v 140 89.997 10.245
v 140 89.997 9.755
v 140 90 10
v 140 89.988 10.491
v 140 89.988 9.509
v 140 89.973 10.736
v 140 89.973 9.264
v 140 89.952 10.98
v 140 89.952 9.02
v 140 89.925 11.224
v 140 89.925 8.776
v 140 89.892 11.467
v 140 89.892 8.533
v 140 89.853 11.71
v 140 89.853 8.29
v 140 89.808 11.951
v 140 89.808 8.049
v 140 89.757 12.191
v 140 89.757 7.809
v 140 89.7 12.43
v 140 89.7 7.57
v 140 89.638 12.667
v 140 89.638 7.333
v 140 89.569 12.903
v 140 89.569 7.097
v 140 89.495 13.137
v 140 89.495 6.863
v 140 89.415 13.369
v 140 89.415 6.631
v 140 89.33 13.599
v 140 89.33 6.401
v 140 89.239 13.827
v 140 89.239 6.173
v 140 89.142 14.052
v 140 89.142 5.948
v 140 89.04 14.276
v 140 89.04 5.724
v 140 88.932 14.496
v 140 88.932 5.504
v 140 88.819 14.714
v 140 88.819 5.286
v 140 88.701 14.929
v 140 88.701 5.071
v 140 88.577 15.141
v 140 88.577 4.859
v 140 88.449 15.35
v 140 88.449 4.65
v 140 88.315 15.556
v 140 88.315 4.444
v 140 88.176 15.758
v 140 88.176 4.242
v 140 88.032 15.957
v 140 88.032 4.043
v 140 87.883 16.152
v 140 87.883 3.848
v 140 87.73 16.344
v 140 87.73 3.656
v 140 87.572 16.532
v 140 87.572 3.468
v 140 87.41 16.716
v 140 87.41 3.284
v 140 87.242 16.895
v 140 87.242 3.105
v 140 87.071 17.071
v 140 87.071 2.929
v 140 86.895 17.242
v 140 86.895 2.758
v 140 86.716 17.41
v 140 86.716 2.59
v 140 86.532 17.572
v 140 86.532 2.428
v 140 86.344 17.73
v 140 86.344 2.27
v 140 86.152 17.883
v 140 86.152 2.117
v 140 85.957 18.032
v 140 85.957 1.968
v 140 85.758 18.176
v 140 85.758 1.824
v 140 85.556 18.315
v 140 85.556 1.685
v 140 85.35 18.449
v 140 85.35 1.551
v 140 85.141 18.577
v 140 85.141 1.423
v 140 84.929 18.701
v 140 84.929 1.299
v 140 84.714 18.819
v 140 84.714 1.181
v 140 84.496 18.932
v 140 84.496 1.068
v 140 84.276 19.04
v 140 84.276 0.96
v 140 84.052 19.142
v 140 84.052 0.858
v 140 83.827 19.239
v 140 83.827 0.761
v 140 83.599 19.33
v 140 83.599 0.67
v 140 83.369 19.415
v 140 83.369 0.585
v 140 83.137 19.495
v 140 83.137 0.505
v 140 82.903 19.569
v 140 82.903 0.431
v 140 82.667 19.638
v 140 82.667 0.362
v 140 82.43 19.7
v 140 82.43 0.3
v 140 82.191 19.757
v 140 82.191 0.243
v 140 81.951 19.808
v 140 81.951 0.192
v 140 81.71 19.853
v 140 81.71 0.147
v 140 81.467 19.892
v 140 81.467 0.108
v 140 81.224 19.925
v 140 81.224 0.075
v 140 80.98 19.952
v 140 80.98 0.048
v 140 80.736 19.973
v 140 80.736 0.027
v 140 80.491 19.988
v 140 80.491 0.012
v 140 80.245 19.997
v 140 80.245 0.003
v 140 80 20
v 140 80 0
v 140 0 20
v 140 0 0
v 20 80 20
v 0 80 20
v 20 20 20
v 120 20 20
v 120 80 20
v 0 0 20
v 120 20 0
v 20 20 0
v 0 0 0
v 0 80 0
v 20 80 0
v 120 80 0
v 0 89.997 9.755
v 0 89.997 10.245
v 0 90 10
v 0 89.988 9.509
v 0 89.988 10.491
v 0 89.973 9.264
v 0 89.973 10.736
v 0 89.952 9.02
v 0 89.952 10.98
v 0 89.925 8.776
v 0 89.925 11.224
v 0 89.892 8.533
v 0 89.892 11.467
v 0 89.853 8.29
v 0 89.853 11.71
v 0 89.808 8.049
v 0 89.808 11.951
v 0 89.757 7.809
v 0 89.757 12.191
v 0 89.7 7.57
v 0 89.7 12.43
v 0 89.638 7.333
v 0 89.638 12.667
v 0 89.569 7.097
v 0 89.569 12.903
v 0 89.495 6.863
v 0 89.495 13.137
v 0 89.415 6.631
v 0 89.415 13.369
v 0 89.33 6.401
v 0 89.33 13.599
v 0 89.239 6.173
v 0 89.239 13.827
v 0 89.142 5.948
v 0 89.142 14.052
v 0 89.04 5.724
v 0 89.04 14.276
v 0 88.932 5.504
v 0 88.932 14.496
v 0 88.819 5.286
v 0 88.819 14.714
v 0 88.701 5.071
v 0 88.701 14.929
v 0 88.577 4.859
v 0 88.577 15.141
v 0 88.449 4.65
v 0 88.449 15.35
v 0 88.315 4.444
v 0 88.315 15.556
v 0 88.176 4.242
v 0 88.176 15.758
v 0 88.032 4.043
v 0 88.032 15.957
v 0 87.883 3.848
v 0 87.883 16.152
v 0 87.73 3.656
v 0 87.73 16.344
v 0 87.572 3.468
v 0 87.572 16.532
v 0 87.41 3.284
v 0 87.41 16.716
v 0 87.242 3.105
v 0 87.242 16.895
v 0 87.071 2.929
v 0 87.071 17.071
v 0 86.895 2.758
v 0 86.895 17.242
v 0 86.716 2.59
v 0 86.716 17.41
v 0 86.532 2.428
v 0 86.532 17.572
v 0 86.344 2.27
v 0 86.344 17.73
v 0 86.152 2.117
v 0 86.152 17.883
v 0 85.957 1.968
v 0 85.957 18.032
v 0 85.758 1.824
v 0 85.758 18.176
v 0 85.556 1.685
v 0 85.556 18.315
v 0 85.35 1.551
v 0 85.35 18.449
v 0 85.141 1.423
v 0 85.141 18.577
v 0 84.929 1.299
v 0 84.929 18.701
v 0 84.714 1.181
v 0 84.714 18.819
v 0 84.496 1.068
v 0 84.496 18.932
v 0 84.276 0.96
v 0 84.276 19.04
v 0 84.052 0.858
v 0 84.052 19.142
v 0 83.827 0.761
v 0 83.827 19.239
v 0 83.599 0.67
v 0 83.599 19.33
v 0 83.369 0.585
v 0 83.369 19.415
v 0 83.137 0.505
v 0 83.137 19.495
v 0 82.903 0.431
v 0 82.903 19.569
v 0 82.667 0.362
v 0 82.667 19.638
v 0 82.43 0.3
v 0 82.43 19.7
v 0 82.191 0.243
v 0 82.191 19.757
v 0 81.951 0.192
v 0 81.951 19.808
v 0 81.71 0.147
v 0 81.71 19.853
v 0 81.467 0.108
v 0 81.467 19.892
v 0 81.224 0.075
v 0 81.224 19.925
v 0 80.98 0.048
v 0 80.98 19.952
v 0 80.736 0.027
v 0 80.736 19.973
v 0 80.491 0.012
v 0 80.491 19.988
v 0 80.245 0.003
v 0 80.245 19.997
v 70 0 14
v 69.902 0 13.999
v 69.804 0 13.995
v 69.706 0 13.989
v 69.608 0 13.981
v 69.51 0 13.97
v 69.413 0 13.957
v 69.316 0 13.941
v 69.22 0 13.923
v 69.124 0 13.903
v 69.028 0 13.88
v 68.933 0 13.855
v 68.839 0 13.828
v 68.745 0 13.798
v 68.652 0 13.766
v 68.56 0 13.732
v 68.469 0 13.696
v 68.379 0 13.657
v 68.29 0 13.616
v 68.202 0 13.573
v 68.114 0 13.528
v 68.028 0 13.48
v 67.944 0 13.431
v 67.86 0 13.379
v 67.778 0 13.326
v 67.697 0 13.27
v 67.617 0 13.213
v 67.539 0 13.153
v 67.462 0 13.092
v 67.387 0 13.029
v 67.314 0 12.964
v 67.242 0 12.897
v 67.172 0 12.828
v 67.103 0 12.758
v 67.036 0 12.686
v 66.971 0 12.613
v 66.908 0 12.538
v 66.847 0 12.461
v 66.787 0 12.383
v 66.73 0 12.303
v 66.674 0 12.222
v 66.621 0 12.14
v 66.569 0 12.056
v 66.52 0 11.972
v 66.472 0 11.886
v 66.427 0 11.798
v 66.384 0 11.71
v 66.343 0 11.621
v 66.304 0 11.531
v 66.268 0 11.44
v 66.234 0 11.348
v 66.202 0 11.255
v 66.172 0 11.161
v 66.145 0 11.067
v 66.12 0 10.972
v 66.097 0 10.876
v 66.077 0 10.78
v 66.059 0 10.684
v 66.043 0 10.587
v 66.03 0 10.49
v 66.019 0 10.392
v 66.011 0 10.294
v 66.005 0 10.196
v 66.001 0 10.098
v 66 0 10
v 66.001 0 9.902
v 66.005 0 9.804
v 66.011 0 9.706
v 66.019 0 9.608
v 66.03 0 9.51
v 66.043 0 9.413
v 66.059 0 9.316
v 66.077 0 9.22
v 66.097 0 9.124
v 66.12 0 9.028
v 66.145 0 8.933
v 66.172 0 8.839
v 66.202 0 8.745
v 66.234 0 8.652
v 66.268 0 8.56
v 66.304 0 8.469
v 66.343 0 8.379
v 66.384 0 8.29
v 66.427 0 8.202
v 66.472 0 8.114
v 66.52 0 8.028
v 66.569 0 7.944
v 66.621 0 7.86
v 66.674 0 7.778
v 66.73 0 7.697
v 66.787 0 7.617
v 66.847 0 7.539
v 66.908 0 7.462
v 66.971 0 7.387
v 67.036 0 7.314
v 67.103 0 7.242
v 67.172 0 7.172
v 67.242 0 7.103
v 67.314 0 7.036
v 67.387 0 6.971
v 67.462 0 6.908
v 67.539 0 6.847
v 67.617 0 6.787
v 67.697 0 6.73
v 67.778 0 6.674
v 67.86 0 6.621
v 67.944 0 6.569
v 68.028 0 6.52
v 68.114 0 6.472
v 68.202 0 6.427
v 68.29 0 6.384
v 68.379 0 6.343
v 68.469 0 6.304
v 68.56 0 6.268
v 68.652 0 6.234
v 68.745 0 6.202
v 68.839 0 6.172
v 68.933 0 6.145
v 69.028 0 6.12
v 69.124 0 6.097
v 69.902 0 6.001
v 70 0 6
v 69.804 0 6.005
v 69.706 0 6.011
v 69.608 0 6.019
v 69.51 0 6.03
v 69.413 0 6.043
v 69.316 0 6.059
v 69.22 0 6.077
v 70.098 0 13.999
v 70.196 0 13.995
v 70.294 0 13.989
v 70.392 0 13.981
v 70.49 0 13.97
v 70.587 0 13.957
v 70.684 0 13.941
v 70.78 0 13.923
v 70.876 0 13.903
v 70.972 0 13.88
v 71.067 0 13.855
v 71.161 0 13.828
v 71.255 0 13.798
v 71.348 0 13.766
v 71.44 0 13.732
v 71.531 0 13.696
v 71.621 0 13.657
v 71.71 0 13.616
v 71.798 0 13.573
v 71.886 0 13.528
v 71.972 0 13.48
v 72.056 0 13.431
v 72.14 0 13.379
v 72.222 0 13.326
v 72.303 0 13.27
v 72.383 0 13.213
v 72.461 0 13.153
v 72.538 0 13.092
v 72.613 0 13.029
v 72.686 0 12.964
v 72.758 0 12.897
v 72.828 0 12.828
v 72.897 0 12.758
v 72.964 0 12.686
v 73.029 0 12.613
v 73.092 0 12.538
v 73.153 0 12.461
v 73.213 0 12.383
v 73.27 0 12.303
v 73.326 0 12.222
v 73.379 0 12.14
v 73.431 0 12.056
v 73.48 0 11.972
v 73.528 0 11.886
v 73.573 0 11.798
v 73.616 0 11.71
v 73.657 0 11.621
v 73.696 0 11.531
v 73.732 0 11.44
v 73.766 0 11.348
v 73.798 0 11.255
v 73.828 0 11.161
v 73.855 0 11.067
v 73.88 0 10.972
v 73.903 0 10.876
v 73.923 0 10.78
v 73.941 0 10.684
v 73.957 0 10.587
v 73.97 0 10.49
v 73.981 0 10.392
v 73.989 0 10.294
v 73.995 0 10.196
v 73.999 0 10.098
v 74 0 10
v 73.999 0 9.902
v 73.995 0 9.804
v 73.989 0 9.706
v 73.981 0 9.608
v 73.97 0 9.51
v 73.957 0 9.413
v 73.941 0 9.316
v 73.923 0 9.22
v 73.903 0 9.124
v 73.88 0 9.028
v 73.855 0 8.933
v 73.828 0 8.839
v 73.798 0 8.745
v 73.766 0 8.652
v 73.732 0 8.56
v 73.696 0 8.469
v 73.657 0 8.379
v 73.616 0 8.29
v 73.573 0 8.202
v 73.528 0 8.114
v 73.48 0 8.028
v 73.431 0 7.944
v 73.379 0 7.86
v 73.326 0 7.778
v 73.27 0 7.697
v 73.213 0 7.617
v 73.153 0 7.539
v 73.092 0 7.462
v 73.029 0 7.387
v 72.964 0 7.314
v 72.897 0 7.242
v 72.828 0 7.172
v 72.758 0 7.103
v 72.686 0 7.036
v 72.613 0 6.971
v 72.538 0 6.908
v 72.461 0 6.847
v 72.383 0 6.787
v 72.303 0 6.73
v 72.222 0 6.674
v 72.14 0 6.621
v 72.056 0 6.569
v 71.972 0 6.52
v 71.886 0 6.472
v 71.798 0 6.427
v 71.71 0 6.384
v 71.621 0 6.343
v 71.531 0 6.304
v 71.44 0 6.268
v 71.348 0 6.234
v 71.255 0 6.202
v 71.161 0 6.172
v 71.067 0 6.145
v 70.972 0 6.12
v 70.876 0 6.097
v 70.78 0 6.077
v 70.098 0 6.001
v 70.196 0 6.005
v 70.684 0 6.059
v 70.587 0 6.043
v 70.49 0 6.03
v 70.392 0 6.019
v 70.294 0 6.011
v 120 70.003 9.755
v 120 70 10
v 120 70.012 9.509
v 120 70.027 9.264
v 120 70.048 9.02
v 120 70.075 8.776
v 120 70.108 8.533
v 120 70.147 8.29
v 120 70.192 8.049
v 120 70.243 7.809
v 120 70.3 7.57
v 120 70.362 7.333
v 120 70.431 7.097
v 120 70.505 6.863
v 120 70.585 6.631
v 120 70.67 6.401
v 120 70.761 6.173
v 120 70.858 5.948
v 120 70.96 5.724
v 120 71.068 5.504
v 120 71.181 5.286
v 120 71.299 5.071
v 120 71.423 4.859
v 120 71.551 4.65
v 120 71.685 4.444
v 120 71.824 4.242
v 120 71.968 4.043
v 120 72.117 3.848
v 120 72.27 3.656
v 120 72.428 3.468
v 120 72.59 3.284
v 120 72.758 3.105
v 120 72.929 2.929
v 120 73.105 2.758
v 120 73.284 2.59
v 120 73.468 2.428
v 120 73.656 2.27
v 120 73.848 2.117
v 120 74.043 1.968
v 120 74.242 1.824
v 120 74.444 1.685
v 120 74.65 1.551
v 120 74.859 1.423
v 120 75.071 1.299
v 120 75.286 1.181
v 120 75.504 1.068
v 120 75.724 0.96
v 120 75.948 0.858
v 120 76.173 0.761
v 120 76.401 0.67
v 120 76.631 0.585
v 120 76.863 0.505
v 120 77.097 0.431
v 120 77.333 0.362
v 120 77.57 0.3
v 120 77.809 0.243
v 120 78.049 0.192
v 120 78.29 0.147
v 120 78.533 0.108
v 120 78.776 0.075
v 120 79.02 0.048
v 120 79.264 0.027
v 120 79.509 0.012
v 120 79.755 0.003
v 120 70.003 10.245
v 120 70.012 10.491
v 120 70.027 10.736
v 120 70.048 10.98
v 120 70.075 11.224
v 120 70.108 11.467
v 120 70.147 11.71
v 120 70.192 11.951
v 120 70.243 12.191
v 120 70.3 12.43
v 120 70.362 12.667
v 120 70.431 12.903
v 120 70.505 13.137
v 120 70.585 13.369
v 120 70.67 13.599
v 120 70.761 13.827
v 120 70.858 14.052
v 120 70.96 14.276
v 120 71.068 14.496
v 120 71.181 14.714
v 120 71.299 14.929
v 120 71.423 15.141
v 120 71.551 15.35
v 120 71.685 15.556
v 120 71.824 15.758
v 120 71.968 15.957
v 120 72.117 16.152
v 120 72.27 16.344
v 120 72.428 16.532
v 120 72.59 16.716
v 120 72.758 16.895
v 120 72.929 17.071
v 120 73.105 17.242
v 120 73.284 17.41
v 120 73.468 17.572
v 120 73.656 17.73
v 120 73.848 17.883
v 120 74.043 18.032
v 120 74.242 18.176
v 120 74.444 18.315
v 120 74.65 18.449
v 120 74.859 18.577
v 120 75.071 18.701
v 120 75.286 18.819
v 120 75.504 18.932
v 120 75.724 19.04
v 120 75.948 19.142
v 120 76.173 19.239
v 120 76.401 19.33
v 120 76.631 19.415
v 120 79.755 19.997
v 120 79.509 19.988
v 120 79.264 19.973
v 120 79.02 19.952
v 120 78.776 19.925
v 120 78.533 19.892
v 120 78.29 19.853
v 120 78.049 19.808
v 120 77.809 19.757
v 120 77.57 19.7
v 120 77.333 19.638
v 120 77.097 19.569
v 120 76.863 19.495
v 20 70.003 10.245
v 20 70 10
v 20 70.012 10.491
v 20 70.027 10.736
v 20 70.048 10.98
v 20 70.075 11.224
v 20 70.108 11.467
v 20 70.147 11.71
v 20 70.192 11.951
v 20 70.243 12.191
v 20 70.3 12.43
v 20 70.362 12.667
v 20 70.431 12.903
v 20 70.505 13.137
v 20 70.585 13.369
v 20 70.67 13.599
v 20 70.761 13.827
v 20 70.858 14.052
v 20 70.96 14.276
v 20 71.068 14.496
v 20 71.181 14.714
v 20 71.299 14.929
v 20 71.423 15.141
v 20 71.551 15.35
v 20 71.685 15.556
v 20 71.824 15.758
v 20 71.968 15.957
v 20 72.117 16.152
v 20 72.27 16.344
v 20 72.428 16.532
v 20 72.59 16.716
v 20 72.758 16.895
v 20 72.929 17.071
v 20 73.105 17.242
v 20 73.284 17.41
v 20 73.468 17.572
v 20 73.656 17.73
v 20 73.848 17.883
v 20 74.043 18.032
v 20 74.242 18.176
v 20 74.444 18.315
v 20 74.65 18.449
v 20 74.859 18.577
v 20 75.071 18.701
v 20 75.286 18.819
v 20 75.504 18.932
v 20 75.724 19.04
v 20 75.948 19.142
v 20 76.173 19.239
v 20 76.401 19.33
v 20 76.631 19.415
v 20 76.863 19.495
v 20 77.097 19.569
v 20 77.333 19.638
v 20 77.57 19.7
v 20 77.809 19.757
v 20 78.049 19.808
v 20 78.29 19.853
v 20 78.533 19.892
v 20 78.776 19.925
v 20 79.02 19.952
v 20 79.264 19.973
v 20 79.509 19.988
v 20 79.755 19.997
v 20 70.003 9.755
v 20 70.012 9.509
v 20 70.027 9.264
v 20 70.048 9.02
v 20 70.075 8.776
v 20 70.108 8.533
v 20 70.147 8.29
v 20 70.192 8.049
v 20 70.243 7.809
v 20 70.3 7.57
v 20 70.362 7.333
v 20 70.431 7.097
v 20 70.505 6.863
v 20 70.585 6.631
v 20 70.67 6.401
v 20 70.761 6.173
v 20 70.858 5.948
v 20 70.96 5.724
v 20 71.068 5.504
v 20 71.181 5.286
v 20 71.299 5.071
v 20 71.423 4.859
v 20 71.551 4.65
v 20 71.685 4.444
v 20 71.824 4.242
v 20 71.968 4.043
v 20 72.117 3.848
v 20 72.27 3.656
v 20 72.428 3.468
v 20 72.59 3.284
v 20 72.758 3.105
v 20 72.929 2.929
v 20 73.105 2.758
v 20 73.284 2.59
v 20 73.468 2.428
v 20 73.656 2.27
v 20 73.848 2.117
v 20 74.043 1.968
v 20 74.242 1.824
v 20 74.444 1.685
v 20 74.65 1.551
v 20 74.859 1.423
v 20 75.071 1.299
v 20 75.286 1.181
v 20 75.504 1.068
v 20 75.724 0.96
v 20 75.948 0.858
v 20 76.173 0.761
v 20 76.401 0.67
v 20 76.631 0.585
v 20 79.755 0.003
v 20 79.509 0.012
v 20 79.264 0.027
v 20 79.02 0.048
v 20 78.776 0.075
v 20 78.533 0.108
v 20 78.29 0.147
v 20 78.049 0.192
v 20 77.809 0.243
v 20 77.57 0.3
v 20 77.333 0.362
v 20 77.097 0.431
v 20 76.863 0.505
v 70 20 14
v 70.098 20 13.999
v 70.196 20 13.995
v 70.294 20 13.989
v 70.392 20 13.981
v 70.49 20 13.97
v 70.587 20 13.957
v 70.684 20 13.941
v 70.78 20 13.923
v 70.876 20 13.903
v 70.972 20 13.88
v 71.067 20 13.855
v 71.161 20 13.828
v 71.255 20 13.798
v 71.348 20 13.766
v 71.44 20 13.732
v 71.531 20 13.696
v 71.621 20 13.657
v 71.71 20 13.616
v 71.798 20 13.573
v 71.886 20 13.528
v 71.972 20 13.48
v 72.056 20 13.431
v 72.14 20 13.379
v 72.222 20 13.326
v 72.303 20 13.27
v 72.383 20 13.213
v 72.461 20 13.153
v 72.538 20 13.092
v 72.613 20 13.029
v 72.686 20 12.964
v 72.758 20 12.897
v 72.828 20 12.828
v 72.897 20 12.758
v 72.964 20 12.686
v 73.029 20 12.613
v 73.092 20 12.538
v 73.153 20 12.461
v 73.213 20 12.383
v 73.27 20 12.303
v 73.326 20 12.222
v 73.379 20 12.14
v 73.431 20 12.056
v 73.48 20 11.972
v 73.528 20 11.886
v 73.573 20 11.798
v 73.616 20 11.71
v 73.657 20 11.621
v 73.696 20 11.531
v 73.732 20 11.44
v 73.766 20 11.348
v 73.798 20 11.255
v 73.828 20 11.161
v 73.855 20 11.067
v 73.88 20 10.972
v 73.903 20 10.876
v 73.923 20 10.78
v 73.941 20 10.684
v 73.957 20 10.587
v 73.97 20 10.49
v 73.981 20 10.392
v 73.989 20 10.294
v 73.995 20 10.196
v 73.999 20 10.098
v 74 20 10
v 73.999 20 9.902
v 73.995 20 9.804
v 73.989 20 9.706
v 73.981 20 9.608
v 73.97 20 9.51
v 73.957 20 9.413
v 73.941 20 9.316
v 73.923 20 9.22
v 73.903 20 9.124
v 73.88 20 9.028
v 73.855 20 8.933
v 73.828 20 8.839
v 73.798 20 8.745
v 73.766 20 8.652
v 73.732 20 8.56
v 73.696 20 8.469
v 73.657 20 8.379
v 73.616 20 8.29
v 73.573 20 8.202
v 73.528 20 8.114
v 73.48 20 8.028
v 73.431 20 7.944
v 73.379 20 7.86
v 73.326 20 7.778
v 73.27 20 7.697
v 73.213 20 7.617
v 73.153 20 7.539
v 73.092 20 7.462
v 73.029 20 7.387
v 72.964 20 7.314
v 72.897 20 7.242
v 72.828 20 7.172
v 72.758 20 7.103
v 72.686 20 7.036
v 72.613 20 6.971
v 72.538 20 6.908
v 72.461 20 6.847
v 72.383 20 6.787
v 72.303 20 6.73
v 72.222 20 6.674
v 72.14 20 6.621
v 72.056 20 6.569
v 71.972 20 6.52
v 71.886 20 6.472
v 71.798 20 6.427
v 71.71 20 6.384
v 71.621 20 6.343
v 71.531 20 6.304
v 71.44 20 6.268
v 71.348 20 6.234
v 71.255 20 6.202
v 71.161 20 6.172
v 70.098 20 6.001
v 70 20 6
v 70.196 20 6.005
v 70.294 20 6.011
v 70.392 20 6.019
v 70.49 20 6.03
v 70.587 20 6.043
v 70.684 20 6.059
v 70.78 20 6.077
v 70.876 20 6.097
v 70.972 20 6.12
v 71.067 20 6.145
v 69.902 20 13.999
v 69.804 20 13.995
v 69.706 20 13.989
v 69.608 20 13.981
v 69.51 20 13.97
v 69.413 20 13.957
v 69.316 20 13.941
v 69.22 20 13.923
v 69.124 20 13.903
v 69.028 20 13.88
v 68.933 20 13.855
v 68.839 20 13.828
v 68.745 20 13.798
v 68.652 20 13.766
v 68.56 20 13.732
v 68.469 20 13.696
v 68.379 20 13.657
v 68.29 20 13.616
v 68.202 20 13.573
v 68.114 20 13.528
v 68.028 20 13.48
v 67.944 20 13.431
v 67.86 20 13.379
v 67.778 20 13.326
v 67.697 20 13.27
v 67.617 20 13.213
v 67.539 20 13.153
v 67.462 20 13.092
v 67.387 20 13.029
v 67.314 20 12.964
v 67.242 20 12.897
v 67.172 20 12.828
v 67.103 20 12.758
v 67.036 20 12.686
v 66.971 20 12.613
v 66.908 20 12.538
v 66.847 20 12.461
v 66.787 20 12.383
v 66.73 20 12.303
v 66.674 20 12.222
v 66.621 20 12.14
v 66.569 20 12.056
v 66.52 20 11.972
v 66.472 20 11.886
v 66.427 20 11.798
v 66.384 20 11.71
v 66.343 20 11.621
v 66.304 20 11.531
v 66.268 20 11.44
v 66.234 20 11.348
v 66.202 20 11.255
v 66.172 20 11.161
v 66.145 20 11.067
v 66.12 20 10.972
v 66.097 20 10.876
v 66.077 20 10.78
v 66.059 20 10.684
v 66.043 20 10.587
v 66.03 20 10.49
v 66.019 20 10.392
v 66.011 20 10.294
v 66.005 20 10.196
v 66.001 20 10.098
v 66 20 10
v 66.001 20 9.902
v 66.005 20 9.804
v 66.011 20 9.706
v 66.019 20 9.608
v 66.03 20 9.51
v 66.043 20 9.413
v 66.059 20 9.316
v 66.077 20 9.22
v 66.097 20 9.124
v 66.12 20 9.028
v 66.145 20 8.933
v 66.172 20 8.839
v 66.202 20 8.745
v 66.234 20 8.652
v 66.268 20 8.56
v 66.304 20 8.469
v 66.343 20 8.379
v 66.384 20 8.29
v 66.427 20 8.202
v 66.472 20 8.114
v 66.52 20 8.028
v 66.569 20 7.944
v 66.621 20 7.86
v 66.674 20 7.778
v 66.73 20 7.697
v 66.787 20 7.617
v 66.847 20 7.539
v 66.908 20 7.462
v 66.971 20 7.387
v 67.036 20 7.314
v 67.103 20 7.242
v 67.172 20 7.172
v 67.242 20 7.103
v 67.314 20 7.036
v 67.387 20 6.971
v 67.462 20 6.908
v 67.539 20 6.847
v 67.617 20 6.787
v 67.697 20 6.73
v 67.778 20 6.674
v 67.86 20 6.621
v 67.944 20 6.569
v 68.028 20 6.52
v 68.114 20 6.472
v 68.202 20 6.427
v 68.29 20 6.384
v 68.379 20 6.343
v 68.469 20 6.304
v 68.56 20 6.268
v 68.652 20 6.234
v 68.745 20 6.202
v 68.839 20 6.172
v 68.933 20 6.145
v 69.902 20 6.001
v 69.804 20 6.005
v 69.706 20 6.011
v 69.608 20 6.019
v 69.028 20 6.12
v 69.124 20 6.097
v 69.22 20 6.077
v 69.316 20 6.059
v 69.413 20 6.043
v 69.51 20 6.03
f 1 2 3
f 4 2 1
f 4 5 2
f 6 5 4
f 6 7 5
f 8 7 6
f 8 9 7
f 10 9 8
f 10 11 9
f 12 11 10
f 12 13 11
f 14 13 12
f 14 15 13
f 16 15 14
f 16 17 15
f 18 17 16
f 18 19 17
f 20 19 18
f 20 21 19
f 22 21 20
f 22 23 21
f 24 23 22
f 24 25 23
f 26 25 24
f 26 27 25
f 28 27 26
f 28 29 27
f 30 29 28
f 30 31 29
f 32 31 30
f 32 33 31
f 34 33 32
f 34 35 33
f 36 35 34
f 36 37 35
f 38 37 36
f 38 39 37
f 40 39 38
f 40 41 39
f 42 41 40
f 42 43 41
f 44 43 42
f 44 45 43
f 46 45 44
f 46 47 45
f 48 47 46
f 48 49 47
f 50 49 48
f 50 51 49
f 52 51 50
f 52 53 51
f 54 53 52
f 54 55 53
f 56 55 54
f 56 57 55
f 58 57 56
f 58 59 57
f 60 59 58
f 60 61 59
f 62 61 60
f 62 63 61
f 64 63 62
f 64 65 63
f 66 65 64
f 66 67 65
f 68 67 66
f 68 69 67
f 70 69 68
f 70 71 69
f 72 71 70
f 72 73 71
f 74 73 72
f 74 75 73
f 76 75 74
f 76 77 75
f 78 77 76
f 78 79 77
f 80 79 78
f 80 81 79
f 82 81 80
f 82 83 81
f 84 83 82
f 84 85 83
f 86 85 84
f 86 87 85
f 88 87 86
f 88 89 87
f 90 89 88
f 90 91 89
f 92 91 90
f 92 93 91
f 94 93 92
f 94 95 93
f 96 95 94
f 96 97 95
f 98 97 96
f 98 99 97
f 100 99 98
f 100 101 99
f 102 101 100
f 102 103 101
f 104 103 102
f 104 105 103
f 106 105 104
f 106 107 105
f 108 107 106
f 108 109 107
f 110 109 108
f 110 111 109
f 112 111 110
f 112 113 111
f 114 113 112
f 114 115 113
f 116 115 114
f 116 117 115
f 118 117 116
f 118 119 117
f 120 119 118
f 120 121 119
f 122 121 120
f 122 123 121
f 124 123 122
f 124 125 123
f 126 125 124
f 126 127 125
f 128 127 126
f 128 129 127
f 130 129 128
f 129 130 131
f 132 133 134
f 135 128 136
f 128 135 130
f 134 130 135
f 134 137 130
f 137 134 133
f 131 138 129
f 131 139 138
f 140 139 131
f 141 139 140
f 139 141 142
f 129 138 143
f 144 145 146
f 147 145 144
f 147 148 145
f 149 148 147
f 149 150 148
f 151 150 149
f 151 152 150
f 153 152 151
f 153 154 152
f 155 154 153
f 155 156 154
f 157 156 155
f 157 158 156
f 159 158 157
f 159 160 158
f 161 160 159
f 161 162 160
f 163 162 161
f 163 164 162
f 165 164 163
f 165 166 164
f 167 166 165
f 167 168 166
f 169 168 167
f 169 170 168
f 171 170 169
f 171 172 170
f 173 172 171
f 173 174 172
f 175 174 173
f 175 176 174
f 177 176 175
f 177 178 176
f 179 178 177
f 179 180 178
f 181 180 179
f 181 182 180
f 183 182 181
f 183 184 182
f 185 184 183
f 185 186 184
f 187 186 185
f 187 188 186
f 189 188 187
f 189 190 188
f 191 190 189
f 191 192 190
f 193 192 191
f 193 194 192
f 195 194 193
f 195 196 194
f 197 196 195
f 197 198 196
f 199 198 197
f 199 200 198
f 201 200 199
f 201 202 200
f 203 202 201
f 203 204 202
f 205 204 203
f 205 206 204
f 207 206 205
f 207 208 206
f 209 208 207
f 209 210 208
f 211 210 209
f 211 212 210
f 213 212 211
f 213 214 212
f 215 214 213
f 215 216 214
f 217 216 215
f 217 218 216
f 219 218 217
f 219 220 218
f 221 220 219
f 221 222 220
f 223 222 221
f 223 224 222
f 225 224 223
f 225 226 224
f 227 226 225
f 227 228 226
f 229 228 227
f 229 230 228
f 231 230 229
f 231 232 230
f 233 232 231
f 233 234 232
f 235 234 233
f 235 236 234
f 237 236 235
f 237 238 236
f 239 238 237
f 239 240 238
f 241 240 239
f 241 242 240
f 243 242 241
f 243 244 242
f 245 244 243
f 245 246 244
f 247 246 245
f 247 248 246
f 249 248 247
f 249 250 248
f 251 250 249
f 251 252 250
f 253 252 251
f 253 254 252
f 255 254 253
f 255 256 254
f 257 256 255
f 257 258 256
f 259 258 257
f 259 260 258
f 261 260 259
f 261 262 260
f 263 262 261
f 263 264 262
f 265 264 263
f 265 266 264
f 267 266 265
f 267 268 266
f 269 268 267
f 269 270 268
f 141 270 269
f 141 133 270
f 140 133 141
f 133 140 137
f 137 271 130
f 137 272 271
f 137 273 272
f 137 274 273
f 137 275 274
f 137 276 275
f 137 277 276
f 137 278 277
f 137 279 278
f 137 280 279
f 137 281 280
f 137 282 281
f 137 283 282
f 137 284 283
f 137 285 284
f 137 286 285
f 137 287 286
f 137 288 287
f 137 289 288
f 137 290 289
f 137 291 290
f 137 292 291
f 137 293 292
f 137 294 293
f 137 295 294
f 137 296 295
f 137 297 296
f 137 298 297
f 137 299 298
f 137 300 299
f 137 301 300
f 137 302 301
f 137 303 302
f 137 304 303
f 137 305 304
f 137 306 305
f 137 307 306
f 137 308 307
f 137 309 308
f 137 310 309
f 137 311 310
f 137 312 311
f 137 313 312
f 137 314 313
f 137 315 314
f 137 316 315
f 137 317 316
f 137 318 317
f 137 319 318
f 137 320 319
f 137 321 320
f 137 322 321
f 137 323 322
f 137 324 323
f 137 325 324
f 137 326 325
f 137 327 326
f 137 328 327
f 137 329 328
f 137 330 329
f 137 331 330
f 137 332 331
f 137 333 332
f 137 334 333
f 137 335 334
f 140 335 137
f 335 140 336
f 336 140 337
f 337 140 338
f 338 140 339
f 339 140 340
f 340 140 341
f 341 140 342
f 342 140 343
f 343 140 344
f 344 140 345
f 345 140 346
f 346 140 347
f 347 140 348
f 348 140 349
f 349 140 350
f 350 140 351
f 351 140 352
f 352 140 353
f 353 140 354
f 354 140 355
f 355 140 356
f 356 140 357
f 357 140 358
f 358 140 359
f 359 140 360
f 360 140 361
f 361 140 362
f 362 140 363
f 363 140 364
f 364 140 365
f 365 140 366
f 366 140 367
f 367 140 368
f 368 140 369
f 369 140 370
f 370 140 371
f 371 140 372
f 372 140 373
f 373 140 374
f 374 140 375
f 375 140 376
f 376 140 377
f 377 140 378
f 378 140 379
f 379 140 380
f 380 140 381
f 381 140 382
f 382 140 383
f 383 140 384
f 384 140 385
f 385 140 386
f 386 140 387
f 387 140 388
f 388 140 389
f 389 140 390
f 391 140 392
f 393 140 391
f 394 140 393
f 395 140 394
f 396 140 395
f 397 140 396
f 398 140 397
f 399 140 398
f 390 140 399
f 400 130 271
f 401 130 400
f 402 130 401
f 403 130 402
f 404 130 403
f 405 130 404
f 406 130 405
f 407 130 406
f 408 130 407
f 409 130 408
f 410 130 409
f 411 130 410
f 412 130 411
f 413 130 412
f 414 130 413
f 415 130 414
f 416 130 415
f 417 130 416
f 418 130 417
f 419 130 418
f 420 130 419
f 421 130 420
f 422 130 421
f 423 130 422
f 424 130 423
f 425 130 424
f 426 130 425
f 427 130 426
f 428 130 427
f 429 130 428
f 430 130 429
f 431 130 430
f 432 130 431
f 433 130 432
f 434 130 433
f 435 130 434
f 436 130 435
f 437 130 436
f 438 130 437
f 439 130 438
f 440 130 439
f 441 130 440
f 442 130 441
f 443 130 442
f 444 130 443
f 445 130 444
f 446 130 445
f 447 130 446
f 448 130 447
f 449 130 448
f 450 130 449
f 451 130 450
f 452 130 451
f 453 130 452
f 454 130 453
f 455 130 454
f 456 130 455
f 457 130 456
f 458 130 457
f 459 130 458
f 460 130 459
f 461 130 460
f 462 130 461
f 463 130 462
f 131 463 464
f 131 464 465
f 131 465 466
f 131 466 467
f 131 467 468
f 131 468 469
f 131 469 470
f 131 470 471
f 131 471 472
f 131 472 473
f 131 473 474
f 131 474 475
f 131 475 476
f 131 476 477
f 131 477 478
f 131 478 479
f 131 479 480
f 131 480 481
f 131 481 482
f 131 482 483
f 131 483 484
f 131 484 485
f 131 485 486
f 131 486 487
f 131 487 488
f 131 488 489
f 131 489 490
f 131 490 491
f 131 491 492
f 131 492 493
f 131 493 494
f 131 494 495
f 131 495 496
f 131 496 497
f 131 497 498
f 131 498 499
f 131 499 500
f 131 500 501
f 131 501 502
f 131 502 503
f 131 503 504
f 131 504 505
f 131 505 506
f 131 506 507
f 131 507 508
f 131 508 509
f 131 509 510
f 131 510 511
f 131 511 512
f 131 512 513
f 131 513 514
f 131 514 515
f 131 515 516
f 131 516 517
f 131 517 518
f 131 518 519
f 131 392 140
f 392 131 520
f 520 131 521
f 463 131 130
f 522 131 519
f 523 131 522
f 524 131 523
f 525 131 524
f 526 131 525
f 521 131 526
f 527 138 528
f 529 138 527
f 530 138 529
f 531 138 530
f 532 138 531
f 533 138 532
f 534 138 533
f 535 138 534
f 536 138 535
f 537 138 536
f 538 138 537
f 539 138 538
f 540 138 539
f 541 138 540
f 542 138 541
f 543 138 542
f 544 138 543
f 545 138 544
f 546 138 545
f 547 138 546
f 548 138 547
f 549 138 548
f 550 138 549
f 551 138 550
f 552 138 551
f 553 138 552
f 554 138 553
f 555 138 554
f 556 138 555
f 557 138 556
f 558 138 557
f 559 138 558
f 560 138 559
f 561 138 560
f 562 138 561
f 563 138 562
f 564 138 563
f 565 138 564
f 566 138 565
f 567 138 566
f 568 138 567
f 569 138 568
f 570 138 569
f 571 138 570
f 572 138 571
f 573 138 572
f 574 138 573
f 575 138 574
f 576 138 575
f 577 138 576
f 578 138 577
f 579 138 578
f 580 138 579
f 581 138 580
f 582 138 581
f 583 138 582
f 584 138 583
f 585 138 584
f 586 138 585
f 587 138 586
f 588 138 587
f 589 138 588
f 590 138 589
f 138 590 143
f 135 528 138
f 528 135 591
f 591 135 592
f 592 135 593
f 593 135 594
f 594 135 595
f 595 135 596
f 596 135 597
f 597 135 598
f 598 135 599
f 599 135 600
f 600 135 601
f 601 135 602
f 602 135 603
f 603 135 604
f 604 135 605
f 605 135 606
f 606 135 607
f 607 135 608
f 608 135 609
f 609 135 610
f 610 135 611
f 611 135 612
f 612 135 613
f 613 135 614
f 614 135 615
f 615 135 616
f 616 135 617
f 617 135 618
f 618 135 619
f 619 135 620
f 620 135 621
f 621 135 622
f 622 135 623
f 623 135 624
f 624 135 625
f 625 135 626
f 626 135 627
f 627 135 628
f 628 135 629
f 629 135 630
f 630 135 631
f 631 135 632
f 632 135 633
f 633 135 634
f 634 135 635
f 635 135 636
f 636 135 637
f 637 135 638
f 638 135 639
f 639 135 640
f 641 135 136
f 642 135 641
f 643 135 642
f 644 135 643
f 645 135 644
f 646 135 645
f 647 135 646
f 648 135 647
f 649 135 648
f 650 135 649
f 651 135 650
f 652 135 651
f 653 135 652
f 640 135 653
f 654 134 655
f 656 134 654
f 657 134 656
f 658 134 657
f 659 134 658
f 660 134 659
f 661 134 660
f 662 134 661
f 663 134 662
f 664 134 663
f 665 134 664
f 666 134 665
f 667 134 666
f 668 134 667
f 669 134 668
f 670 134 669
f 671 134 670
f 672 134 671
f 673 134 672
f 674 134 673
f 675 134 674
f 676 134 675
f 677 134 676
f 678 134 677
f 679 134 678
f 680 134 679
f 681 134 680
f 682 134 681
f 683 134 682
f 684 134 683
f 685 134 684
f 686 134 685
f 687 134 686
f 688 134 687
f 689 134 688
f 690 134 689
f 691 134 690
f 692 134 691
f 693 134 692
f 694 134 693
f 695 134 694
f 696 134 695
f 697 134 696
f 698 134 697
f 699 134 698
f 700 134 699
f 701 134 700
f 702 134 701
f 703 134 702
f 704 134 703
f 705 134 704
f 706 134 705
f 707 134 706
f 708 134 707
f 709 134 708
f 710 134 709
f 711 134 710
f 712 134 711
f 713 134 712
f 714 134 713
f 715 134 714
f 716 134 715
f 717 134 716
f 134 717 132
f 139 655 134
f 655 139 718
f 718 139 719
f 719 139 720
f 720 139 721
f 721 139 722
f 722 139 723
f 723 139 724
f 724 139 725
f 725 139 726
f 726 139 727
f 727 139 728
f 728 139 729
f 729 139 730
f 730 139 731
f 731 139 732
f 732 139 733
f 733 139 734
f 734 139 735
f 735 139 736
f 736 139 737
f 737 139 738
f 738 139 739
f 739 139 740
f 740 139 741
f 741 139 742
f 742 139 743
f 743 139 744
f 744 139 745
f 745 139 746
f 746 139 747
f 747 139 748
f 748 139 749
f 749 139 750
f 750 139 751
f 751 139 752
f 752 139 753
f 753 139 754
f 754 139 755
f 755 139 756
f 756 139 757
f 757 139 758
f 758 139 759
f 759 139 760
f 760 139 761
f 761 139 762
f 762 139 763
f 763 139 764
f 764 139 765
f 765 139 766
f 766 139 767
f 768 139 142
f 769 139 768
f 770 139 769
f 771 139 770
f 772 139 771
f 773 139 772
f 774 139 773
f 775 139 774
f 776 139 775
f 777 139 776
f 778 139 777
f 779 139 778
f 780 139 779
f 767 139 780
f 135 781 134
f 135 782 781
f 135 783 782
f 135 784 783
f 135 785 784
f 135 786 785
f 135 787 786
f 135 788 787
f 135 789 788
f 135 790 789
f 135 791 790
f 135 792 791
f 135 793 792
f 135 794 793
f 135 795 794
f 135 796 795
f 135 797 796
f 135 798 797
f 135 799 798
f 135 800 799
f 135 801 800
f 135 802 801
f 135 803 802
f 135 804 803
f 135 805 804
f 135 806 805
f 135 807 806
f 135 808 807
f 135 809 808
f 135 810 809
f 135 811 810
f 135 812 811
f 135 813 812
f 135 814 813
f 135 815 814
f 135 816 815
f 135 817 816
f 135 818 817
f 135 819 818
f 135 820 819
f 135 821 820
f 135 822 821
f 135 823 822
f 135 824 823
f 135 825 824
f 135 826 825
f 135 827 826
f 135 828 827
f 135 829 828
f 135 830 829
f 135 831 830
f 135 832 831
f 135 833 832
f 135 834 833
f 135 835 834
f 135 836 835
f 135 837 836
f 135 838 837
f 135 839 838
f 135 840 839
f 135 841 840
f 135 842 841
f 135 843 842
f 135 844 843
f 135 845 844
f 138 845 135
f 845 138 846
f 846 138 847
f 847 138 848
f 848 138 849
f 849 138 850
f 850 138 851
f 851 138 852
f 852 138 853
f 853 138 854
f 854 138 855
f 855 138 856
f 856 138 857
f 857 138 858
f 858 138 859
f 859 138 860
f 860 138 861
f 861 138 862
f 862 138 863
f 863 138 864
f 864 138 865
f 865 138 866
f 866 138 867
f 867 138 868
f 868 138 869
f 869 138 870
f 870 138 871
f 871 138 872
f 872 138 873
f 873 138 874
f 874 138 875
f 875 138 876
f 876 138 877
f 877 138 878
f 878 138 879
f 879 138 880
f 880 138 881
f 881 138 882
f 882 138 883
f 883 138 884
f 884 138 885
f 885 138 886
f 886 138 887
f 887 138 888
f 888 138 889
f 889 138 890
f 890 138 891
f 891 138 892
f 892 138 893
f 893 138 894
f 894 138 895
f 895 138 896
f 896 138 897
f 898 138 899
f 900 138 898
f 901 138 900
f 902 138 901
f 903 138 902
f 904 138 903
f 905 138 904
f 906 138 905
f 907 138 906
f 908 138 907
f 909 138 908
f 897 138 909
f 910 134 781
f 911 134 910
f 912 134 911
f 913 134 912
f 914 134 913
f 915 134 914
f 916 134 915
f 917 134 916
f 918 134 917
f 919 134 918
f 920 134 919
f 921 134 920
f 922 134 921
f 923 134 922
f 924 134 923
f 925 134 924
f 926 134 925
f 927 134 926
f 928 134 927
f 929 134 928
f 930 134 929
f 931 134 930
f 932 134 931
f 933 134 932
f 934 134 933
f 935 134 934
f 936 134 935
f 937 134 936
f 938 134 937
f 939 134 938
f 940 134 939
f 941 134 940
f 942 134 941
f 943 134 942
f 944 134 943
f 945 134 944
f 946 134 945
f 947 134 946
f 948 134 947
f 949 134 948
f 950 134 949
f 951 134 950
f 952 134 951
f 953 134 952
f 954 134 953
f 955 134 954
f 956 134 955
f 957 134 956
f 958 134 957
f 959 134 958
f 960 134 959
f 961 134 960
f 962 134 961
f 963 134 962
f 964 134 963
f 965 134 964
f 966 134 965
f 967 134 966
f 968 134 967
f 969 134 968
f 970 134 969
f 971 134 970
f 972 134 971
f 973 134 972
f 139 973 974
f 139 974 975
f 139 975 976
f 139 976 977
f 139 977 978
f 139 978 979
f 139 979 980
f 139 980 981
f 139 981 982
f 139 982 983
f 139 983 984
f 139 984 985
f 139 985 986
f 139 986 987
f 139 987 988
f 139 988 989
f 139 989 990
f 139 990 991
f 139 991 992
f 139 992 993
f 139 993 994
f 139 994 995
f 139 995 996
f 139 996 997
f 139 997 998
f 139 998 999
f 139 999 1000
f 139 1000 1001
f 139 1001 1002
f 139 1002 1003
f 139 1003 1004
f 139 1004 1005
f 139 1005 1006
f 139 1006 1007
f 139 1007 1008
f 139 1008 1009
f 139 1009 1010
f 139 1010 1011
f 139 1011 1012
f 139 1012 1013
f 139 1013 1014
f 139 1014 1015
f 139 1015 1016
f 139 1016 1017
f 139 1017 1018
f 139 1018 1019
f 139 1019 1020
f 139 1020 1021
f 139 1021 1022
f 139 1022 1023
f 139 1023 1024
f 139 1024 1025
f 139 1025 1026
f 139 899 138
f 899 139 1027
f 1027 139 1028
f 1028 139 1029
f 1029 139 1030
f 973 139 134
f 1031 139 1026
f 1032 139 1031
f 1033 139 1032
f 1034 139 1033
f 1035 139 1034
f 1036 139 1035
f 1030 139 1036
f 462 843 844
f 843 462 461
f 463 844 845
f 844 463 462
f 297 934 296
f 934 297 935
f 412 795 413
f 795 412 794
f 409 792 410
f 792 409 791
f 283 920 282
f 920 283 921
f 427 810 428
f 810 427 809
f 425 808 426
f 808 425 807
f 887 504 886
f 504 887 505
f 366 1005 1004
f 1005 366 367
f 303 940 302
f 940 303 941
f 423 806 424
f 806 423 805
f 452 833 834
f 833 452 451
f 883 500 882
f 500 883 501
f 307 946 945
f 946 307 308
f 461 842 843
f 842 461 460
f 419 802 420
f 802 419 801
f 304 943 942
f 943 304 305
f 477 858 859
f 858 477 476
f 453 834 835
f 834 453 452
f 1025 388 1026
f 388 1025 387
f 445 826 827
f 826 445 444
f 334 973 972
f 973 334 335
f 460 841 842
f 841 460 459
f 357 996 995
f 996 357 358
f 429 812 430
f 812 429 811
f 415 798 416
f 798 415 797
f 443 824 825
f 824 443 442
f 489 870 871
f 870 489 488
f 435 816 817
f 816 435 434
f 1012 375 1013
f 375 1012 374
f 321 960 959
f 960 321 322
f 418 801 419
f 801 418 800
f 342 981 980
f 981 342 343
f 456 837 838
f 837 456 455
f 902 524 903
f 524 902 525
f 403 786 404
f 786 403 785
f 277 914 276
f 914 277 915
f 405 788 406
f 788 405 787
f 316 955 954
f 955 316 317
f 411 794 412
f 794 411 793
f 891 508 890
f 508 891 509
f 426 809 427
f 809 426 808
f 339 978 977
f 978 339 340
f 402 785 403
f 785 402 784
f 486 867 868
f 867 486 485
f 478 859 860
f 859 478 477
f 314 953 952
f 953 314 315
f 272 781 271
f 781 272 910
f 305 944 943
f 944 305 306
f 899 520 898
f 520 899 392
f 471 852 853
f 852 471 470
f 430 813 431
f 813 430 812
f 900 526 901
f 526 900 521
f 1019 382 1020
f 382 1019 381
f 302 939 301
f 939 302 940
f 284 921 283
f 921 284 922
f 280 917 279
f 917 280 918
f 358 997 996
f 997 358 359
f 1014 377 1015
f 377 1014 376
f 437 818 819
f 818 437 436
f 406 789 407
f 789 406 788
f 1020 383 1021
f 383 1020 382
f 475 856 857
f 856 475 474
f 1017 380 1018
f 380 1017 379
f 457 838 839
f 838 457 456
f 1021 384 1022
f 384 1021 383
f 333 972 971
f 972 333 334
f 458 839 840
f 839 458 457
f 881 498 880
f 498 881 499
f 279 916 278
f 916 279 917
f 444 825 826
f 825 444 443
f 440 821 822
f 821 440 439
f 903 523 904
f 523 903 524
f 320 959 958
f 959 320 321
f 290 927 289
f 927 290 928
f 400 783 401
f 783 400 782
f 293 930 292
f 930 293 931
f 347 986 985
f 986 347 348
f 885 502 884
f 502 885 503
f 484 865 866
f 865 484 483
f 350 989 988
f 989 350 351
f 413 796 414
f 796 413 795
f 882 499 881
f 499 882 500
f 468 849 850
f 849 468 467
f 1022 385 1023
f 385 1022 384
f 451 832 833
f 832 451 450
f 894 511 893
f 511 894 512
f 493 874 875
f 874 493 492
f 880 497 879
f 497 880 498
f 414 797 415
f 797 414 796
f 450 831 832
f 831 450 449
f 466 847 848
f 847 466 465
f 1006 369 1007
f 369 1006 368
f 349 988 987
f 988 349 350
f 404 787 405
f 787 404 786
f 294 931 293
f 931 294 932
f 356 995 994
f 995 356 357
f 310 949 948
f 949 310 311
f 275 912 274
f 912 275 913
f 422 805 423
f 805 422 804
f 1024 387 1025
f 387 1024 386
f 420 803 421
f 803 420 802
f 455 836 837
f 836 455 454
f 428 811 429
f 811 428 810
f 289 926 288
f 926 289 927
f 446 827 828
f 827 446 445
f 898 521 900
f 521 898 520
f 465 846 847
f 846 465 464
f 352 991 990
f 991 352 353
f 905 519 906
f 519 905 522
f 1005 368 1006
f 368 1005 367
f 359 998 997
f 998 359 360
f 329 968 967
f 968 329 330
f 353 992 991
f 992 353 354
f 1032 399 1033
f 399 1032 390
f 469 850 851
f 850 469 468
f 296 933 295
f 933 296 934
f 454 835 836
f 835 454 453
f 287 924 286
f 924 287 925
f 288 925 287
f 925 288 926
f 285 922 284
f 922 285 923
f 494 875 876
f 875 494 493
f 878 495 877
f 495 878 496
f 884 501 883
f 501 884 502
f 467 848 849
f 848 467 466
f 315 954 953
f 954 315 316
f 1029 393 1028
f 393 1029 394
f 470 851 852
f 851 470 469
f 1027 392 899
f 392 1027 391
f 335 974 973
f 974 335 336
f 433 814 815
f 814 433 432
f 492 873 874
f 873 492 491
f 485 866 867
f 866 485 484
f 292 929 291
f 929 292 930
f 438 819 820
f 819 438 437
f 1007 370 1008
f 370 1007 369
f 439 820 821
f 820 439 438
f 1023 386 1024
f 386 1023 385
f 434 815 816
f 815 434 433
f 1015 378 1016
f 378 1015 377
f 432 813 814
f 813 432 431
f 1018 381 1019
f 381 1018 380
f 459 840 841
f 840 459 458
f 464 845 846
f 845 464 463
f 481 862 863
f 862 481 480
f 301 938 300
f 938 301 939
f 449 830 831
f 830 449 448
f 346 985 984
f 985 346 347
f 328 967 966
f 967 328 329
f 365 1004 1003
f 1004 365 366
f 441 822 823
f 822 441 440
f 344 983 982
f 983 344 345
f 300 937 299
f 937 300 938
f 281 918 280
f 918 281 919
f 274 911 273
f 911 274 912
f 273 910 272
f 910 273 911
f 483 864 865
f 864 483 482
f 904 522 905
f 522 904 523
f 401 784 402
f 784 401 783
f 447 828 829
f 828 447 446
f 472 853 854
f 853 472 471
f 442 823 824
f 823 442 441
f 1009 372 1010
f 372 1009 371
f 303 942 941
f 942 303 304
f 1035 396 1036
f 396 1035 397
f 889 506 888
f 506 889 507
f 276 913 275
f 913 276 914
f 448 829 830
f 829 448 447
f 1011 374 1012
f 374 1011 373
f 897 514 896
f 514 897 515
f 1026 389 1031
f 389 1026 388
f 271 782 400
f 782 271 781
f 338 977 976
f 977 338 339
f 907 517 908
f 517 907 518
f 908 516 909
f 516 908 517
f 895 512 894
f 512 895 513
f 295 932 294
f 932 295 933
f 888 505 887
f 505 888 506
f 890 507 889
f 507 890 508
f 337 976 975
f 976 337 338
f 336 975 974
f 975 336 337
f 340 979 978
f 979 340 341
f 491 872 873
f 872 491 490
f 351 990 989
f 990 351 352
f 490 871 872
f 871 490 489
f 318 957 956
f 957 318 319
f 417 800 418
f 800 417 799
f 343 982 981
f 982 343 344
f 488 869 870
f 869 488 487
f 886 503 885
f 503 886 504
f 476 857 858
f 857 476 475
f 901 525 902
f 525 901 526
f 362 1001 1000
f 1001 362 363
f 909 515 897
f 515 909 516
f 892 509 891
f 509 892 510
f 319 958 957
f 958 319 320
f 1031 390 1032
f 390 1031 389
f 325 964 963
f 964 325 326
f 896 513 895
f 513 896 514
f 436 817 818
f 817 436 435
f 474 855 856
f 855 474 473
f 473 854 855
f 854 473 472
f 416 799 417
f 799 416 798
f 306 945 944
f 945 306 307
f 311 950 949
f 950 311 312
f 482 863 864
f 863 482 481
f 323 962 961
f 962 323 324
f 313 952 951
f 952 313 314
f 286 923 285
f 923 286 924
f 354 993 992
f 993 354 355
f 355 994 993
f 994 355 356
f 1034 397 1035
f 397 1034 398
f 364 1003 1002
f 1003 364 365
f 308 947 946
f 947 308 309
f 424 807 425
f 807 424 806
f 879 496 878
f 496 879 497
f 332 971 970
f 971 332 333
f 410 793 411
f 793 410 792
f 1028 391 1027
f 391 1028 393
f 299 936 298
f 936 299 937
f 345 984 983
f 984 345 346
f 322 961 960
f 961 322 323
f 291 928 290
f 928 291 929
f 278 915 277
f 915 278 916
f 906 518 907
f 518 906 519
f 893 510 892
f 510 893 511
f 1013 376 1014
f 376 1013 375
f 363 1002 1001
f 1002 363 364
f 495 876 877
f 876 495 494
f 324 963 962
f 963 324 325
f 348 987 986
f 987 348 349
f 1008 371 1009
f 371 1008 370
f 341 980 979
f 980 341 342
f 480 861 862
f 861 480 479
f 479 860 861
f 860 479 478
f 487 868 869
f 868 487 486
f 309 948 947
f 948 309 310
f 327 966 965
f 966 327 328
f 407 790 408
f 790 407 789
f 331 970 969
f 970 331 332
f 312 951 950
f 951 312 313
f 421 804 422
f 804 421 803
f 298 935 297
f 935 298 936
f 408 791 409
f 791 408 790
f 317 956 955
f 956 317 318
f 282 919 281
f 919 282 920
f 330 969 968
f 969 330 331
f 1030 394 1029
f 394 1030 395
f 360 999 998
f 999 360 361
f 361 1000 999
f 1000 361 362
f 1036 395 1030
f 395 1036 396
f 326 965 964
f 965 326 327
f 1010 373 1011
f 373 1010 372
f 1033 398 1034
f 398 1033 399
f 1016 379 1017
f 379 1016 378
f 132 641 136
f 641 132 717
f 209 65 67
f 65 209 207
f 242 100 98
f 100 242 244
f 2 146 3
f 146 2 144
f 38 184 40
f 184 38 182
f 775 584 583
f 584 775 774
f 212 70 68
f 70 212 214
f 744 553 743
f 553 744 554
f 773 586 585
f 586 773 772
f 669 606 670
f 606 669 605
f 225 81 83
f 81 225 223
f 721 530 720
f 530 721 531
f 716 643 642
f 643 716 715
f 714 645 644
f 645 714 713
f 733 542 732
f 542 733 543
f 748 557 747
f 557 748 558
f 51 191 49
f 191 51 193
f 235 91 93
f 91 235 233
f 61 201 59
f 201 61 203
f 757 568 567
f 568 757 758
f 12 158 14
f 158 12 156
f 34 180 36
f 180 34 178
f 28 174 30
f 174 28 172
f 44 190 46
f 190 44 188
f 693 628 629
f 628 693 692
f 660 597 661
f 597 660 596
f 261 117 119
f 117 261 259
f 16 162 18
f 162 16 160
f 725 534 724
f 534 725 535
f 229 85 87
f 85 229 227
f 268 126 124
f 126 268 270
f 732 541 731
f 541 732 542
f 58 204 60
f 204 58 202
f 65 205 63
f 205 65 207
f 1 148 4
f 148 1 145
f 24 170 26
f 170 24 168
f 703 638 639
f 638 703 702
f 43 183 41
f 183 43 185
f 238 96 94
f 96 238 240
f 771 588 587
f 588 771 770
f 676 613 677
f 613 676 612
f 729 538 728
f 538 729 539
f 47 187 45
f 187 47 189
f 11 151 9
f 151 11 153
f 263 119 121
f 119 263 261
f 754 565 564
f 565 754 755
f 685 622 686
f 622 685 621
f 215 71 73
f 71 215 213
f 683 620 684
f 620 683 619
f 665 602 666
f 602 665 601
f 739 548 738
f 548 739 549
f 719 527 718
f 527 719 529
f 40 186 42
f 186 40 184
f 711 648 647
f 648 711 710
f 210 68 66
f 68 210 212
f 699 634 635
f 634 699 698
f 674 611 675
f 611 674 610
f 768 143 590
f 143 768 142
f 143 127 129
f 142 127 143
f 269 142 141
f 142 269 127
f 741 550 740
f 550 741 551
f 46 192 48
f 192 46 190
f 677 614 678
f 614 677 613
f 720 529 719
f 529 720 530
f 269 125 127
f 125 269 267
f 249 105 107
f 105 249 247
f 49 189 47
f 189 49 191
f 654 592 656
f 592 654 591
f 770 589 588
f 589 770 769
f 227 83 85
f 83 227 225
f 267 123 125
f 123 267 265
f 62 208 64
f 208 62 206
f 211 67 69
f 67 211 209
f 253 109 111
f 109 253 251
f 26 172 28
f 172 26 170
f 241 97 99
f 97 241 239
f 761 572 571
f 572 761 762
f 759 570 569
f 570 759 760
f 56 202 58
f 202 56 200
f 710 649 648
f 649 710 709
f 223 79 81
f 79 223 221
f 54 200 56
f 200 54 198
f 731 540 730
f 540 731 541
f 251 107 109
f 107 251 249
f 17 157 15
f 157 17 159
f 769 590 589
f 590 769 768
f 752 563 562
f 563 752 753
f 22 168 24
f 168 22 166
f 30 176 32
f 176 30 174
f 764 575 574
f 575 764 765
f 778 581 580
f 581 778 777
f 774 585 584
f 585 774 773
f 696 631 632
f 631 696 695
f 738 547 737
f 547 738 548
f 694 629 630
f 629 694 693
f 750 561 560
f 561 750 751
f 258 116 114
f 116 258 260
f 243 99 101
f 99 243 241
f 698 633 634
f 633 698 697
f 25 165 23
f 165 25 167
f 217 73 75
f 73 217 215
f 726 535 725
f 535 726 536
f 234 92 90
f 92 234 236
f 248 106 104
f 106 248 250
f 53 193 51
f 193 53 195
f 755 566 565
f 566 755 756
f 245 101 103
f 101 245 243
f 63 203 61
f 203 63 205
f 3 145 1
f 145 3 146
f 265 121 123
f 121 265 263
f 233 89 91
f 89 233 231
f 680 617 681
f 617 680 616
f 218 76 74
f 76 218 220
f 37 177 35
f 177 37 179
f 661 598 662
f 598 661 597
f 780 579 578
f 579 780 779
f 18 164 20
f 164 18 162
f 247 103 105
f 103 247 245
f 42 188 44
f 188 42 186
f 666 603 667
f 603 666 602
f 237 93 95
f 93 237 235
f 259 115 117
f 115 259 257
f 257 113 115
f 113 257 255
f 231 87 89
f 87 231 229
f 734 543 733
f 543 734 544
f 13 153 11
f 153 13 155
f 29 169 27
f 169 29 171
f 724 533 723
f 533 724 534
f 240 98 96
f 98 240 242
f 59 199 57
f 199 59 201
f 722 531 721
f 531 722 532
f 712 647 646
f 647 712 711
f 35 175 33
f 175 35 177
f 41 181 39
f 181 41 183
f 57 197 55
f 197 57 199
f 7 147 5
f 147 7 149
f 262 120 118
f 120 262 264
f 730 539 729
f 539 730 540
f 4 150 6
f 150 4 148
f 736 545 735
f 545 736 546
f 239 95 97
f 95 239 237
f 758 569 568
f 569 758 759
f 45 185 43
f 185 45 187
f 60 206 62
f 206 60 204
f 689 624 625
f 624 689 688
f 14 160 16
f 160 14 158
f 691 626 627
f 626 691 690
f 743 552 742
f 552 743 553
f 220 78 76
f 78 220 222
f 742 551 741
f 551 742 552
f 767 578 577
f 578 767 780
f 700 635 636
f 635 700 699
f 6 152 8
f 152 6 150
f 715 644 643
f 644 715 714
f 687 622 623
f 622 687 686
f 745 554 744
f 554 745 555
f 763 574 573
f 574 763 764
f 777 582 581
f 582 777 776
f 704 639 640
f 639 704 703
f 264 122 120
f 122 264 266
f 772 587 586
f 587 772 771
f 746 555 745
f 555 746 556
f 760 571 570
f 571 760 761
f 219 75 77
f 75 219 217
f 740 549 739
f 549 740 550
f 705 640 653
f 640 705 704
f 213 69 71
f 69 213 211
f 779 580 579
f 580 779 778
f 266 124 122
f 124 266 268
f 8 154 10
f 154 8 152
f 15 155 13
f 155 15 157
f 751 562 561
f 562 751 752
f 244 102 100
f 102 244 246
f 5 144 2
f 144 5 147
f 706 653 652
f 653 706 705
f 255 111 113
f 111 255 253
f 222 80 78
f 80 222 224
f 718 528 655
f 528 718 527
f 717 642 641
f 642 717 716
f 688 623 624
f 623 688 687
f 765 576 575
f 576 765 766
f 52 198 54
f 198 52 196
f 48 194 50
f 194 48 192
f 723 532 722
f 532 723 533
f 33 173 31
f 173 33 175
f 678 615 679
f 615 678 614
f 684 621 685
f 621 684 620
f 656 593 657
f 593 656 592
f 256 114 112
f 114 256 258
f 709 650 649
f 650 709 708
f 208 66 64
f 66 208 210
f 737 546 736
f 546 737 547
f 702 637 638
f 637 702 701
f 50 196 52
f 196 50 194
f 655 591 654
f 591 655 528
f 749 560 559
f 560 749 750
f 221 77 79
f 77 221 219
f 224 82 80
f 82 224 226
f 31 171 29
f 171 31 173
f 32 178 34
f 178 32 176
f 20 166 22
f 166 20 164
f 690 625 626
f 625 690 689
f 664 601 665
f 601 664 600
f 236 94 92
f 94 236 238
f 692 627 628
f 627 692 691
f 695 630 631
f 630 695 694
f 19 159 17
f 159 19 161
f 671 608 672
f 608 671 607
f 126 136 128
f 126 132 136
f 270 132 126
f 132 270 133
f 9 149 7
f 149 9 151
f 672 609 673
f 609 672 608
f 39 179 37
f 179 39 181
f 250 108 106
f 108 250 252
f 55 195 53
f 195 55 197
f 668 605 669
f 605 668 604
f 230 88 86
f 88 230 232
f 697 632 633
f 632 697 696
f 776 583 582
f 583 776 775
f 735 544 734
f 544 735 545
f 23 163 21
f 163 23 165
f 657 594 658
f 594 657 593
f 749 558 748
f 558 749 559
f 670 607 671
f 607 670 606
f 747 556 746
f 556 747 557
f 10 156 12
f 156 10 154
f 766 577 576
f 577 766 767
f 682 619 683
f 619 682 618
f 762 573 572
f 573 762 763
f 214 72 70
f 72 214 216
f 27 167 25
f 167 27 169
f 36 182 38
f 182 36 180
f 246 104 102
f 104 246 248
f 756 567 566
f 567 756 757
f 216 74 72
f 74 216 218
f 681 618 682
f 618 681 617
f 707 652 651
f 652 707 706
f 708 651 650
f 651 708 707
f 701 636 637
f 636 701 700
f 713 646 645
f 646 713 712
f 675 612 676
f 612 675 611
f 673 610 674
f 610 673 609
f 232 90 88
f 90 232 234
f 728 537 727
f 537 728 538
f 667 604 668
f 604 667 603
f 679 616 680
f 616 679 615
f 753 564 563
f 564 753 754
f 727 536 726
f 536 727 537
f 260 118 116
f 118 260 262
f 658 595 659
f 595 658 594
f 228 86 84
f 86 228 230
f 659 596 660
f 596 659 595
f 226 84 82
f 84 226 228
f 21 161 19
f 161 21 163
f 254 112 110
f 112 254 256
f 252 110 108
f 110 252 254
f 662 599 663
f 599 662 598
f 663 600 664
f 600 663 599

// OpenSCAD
$fn=256;
difference()
{
  cube([140,80,20]);
  translate([20,20,-5]) cube([100,80,30]);
  translate([70,25,10]) rotate([90,0,0])cylinder(d=8,h=30);
}
translate([0,80,10]) rotate([0,90,0]) cylinder(d=20,h=140);
